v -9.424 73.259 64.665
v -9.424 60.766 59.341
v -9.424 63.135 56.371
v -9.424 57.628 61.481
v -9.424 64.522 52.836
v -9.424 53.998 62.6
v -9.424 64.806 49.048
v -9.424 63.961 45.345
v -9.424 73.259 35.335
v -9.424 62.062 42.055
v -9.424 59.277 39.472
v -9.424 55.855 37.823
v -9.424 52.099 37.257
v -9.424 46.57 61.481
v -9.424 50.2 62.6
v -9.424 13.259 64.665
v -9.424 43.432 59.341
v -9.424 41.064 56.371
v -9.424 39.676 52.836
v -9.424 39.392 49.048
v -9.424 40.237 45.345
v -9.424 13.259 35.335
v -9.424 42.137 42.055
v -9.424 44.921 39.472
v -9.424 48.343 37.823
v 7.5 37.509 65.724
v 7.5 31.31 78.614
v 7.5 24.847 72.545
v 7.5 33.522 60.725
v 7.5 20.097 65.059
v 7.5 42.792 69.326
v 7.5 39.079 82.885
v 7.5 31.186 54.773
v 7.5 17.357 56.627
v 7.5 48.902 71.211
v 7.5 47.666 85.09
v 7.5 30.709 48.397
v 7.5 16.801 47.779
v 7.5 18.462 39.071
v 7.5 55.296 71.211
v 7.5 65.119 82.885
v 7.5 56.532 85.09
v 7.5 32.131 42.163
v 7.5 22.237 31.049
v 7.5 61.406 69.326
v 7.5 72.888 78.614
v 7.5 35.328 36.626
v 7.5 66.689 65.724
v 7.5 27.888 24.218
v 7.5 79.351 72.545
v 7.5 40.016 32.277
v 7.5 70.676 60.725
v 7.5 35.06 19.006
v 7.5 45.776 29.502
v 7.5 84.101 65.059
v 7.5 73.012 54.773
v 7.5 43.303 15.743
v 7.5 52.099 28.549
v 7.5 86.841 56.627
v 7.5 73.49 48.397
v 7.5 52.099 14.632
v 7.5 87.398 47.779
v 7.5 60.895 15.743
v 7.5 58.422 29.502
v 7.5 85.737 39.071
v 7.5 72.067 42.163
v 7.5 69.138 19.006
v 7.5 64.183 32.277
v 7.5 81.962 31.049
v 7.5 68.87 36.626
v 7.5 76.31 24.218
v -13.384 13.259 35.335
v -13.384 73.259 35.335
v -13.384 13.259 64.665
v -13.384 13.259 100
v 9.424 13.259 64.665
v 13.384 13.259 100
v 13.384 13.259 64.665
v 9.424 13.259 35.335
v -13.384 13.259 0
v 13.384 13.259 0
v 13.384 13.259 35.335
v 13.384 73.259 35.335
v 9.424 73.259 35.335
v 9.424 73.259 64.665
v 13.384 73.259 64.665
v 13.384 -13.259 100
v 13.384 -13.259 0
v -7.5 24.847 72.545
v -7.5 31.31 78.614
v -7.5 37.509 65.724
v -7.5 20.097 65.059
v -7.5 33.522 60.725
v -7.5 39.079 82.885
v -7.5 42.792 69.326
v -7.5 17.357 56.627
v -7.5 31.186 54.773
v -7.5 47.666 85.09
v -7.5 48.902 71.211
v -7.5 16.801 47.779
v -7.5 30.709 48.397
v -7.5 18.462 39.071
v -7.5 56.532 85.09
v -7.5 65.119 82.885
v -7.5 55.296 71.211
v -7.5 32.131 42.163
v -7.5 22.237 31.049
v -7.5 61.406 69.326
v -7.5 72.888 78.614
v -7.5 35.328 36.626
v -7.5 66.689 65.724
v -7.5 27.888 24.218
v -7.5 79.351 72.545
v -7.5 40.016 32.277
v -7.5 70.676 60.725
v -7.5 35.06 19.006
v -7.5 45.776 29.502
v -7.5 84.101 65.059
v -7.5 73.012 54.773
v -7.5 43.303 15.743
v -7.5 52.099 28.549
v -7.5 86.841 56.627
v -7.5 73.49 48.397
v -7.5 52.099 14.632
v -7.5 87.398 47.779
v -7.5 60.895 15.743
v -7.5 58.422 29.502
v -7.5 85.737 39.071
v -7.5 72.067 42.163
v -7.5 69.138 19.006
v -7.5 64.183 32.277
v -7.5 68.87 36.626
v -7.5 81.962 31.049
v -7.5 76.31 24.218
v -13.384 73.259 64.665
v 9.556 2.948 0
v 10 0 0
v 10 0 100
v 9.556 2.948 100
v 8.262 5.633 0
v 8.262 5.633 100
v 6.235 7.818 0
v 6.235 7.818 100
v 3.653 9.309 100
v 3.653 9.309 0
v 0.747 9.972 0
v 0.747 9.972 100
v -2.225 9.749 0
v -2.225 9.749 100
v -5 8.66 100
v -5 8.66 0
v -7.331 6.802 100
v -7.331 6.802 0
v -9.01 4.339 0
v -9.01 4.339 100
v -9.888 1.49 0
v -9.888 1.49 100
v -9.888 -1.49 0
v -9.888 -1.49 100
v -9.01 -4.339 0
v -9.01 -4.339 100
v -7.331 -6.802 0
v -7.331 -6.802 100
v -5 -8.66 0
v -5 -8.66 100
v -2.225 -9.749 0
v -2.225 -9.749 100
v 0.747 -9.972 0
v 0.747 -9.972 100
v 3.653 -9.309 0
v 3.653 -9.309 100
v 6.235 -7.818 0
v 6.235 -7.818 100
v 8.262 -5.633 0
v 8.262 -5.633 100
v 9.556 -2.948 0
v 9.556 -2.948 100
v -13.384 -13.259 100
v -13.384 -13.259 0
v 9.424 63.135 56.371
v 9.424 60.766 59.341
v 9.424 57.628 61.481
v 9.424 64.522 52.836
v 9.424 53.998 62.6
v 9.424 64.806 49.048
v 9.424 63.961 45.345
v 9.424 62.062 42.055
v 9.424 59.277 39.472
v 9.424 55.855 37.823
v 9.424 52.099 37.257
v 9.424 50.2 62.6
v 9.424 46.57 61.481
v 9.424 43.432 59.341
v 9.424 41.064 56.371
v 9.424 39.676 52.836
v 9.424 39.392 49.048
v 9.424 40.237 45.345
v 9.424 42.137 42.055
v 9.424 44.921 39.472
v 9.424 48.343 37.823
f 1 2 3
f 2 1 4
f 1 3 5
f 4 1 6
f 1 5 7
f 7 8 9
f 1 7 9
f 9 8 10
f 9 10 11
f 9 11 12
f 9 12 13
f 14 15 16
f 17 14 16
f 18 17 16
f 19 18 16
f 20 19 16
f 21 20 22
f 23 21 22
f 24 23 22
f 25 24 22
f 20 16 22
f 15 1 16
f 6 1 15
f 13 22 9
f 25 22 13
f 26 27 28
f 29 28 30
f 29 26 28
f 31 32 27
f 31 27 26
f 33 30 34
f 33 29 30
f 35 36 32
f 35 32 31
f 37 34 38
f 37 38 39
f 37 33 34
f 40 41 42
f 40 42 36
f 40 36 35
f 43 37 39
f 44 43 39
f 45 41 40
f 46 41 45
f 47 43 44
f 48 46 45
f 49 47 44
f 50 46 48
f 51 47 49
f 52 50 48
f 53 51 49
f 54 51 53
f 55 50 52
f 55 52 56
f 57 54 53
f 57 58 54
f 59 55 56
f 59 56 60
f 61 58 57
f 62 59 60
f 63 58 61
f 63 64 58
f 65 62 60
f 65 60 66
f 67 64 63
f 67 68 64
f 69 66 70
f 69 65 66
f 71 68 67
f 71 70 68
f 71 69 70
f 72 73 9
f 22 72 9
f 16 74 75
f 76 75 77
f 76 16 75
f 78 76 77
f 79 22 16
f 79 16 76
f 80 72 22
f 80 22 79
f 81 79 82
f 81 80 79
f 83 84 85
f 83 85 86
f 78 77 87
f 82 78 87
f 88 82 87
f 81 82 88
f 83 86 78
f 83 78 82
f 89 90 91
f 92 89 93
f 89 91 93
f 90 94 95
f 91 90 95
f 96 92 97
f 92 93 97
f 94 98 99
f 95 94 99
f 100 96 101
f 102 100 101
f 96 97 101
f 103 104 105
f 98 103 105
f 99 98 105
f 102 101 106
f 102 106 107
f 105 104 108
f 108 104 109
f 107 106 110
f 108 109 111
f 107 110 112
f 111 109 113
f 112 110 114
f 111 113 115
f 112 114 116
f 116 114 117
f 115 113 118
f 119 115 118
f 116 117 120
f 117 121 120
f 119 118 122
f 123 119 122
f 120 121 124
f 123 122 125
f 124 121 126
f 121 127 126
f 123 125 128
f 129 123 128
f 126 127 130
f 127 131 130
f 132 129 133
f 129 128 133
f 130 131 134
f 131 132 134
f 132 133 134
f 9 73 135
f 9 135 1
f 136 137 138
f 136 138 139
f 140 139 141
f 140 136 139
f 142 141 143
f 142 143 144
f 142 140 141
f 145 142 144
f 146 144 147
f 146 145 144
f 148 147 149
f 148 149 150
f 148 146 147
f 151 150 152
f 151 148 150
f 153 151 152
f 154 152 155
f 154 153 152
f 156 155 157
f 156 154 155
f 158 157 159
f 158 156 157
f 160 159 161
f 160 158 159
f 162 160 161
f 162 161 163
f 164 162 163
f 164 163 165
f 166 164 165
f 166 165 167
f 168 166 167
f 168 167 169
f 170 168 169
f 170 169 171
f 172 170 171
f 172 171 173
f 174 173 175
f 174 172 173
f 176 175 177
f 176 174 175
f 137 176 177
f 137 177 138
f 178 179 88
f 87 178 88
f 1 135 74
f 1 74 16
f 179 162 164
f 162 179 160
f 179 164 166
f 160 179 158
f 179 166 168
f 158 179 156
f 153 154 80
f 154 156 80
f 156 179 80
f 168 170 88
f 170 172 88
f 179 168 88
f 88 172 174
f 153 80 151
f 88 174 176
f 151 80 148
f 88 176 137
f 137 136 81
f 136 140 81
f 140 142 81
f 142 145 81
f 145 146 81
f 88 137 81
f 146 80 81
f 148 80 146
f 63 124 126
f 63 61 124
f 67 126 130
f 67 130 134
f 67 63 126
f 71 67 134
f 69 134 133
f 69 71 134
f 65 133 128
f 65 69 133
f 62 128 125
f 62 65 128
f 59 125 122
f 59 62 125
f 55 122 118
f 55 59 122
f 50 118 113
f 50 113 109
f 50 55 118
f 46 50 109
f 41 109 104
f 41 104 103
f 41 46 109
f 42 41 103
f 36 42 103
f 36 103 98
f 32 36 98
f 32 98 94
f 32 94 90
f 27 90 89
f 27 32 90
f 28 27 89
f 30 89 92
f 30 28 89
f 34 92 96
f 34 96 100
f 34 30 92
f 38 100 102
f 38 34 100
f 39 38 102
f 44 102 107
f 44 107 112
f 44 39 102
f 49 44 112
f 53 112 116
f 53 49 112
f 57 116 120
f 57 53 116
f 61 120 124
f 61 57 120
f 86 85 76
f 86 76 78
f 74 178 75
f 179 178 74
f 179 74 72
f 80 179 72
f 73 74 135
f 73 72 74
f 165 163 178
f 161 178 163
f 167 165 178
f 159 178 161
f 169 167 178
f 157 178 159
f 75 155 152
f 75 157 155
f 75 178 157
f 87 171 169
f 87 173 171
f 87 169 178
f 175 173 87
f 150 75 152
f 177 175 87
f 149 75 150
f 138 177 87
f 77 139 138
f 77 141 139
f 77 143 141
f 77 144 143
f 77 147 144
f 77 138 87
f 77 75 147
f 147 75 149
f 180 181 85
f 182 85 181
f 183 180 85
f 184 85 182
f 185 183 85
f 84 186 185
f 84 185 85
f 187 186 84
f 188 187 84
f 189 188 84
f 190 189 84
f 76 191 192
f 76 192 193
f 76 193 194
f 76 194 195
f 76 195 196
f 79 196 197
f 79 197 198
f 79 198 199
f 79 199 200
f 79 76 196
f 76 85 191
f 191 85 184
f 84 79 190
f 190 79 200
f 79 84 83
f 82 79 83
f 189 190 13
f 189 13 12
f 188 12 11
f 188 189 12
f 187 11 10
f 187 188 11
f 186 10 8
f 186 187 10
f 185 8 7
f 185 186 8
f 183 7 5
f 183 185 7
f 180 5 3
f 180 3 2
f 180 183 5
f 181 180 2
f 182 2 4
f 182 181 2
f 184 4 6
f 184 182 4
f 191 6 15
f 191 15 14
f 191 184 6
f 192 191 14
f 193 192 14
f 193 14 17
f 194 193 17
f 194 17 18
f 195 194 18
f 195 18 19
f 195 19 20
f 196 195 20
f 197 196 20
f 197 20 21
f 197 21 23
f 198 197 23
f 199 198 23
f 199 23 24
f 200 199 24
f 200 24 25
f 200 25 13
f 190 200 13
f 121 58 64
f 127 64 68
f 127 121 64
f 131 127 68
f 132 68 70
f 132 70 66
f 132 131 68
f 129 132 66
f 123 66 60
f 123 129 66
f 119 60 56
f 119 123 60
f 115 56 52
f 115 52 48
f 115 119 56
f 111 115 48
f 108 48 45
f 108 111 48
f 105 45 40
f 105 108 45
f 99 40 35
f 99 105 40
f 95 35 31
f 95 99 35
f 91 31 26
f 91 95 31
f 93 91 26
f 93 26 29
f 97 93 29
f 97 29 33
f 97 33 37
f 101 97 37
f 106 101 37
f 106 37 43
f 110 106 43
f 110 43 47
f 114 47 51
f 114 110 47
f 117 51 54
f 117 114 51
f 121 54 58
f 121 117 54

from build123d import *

# Parameters (mm, degrees)
SKETCH1_W           = 26.76896329
SKETCH1_H           = 26.518786064
SKETCH1_R           = 10
BOSS_EXTRUDE1_DEPTH = 100
SKETCH2_W           = 3.96078439
SKETCH2_H           = 29.33085839
BOSS_EXTRUDE2_DEPTH = 60
SKETCH3_R           = 12.742651411
BOSS_EXTRUDE3_DEPTH = 22.8081789
SKETCH4_R           = 35.368420272
SKETCH4_R_2         = 21.450602769
BOSS_EXTRUDE4_DEPTH = 7.5


with BuildPart() as part:
    # Sketch1 → Boss-Extrude1 (new body)
    with BuildSketch(Plane.XY):
        Rectangle(SKETCH1_W, SKETCH1_H)
        Circle(SKETCH1_R, mode=Mode.SUBTRACT)
    extrude(amount=BOSS_EXTRUDE1_DEPTH)

    # Sketch2 → Boss-Extrude2 (add)
    with BuildSketch(Plane(origin=(0, 13.259393032, 0), x_dir=(1, 0, 0), z_dir=(0, 1, 0))):
        with Locations((-11.40408945, -50)):
            Rectangle(SKETCH2_W, SKETCH2_H)
        with Locations((11.40408945, -50)):
            Rectangle(SKETCH2_W, SKETCH2_H)
    extrude(amount=BOSS_EXTRUDE2_DEPTH)

    # Sketch3 → Boss-Extrude3 (add)
    with BuildSketch(Plane(origin=(13.384481645, 0, 0), x_dir=(0, 0, -1), z_dir=(1, 0, 0))):
        with Locations((-50, 52.099149036)):
            Circle(SKETCH3_R)
    extrude(amount=-BOSS_EXTRUDE3_DEPTH)


with BuildPart() as body_2:
    # Sketch4 → Boss-Extrude4 (new, symmetric)
    with BuildSketch(Plane(origin=(0, 0, 0), x_dir=(0, 0, -1), z_dir=(1, 0, 0))):
        with Locations((-50, 52.099149036)):
            Circle(SKETCH4_R)
        with Locations((-50, 52.099149036)):
            Circle(SKETCH4_R_2, mode=Mode.SUBTRACT)
    extrude(amount=BOSS_EXTRUDE4_DEPTH, both=True)


solid = Compound([part.part, body_2.part])
